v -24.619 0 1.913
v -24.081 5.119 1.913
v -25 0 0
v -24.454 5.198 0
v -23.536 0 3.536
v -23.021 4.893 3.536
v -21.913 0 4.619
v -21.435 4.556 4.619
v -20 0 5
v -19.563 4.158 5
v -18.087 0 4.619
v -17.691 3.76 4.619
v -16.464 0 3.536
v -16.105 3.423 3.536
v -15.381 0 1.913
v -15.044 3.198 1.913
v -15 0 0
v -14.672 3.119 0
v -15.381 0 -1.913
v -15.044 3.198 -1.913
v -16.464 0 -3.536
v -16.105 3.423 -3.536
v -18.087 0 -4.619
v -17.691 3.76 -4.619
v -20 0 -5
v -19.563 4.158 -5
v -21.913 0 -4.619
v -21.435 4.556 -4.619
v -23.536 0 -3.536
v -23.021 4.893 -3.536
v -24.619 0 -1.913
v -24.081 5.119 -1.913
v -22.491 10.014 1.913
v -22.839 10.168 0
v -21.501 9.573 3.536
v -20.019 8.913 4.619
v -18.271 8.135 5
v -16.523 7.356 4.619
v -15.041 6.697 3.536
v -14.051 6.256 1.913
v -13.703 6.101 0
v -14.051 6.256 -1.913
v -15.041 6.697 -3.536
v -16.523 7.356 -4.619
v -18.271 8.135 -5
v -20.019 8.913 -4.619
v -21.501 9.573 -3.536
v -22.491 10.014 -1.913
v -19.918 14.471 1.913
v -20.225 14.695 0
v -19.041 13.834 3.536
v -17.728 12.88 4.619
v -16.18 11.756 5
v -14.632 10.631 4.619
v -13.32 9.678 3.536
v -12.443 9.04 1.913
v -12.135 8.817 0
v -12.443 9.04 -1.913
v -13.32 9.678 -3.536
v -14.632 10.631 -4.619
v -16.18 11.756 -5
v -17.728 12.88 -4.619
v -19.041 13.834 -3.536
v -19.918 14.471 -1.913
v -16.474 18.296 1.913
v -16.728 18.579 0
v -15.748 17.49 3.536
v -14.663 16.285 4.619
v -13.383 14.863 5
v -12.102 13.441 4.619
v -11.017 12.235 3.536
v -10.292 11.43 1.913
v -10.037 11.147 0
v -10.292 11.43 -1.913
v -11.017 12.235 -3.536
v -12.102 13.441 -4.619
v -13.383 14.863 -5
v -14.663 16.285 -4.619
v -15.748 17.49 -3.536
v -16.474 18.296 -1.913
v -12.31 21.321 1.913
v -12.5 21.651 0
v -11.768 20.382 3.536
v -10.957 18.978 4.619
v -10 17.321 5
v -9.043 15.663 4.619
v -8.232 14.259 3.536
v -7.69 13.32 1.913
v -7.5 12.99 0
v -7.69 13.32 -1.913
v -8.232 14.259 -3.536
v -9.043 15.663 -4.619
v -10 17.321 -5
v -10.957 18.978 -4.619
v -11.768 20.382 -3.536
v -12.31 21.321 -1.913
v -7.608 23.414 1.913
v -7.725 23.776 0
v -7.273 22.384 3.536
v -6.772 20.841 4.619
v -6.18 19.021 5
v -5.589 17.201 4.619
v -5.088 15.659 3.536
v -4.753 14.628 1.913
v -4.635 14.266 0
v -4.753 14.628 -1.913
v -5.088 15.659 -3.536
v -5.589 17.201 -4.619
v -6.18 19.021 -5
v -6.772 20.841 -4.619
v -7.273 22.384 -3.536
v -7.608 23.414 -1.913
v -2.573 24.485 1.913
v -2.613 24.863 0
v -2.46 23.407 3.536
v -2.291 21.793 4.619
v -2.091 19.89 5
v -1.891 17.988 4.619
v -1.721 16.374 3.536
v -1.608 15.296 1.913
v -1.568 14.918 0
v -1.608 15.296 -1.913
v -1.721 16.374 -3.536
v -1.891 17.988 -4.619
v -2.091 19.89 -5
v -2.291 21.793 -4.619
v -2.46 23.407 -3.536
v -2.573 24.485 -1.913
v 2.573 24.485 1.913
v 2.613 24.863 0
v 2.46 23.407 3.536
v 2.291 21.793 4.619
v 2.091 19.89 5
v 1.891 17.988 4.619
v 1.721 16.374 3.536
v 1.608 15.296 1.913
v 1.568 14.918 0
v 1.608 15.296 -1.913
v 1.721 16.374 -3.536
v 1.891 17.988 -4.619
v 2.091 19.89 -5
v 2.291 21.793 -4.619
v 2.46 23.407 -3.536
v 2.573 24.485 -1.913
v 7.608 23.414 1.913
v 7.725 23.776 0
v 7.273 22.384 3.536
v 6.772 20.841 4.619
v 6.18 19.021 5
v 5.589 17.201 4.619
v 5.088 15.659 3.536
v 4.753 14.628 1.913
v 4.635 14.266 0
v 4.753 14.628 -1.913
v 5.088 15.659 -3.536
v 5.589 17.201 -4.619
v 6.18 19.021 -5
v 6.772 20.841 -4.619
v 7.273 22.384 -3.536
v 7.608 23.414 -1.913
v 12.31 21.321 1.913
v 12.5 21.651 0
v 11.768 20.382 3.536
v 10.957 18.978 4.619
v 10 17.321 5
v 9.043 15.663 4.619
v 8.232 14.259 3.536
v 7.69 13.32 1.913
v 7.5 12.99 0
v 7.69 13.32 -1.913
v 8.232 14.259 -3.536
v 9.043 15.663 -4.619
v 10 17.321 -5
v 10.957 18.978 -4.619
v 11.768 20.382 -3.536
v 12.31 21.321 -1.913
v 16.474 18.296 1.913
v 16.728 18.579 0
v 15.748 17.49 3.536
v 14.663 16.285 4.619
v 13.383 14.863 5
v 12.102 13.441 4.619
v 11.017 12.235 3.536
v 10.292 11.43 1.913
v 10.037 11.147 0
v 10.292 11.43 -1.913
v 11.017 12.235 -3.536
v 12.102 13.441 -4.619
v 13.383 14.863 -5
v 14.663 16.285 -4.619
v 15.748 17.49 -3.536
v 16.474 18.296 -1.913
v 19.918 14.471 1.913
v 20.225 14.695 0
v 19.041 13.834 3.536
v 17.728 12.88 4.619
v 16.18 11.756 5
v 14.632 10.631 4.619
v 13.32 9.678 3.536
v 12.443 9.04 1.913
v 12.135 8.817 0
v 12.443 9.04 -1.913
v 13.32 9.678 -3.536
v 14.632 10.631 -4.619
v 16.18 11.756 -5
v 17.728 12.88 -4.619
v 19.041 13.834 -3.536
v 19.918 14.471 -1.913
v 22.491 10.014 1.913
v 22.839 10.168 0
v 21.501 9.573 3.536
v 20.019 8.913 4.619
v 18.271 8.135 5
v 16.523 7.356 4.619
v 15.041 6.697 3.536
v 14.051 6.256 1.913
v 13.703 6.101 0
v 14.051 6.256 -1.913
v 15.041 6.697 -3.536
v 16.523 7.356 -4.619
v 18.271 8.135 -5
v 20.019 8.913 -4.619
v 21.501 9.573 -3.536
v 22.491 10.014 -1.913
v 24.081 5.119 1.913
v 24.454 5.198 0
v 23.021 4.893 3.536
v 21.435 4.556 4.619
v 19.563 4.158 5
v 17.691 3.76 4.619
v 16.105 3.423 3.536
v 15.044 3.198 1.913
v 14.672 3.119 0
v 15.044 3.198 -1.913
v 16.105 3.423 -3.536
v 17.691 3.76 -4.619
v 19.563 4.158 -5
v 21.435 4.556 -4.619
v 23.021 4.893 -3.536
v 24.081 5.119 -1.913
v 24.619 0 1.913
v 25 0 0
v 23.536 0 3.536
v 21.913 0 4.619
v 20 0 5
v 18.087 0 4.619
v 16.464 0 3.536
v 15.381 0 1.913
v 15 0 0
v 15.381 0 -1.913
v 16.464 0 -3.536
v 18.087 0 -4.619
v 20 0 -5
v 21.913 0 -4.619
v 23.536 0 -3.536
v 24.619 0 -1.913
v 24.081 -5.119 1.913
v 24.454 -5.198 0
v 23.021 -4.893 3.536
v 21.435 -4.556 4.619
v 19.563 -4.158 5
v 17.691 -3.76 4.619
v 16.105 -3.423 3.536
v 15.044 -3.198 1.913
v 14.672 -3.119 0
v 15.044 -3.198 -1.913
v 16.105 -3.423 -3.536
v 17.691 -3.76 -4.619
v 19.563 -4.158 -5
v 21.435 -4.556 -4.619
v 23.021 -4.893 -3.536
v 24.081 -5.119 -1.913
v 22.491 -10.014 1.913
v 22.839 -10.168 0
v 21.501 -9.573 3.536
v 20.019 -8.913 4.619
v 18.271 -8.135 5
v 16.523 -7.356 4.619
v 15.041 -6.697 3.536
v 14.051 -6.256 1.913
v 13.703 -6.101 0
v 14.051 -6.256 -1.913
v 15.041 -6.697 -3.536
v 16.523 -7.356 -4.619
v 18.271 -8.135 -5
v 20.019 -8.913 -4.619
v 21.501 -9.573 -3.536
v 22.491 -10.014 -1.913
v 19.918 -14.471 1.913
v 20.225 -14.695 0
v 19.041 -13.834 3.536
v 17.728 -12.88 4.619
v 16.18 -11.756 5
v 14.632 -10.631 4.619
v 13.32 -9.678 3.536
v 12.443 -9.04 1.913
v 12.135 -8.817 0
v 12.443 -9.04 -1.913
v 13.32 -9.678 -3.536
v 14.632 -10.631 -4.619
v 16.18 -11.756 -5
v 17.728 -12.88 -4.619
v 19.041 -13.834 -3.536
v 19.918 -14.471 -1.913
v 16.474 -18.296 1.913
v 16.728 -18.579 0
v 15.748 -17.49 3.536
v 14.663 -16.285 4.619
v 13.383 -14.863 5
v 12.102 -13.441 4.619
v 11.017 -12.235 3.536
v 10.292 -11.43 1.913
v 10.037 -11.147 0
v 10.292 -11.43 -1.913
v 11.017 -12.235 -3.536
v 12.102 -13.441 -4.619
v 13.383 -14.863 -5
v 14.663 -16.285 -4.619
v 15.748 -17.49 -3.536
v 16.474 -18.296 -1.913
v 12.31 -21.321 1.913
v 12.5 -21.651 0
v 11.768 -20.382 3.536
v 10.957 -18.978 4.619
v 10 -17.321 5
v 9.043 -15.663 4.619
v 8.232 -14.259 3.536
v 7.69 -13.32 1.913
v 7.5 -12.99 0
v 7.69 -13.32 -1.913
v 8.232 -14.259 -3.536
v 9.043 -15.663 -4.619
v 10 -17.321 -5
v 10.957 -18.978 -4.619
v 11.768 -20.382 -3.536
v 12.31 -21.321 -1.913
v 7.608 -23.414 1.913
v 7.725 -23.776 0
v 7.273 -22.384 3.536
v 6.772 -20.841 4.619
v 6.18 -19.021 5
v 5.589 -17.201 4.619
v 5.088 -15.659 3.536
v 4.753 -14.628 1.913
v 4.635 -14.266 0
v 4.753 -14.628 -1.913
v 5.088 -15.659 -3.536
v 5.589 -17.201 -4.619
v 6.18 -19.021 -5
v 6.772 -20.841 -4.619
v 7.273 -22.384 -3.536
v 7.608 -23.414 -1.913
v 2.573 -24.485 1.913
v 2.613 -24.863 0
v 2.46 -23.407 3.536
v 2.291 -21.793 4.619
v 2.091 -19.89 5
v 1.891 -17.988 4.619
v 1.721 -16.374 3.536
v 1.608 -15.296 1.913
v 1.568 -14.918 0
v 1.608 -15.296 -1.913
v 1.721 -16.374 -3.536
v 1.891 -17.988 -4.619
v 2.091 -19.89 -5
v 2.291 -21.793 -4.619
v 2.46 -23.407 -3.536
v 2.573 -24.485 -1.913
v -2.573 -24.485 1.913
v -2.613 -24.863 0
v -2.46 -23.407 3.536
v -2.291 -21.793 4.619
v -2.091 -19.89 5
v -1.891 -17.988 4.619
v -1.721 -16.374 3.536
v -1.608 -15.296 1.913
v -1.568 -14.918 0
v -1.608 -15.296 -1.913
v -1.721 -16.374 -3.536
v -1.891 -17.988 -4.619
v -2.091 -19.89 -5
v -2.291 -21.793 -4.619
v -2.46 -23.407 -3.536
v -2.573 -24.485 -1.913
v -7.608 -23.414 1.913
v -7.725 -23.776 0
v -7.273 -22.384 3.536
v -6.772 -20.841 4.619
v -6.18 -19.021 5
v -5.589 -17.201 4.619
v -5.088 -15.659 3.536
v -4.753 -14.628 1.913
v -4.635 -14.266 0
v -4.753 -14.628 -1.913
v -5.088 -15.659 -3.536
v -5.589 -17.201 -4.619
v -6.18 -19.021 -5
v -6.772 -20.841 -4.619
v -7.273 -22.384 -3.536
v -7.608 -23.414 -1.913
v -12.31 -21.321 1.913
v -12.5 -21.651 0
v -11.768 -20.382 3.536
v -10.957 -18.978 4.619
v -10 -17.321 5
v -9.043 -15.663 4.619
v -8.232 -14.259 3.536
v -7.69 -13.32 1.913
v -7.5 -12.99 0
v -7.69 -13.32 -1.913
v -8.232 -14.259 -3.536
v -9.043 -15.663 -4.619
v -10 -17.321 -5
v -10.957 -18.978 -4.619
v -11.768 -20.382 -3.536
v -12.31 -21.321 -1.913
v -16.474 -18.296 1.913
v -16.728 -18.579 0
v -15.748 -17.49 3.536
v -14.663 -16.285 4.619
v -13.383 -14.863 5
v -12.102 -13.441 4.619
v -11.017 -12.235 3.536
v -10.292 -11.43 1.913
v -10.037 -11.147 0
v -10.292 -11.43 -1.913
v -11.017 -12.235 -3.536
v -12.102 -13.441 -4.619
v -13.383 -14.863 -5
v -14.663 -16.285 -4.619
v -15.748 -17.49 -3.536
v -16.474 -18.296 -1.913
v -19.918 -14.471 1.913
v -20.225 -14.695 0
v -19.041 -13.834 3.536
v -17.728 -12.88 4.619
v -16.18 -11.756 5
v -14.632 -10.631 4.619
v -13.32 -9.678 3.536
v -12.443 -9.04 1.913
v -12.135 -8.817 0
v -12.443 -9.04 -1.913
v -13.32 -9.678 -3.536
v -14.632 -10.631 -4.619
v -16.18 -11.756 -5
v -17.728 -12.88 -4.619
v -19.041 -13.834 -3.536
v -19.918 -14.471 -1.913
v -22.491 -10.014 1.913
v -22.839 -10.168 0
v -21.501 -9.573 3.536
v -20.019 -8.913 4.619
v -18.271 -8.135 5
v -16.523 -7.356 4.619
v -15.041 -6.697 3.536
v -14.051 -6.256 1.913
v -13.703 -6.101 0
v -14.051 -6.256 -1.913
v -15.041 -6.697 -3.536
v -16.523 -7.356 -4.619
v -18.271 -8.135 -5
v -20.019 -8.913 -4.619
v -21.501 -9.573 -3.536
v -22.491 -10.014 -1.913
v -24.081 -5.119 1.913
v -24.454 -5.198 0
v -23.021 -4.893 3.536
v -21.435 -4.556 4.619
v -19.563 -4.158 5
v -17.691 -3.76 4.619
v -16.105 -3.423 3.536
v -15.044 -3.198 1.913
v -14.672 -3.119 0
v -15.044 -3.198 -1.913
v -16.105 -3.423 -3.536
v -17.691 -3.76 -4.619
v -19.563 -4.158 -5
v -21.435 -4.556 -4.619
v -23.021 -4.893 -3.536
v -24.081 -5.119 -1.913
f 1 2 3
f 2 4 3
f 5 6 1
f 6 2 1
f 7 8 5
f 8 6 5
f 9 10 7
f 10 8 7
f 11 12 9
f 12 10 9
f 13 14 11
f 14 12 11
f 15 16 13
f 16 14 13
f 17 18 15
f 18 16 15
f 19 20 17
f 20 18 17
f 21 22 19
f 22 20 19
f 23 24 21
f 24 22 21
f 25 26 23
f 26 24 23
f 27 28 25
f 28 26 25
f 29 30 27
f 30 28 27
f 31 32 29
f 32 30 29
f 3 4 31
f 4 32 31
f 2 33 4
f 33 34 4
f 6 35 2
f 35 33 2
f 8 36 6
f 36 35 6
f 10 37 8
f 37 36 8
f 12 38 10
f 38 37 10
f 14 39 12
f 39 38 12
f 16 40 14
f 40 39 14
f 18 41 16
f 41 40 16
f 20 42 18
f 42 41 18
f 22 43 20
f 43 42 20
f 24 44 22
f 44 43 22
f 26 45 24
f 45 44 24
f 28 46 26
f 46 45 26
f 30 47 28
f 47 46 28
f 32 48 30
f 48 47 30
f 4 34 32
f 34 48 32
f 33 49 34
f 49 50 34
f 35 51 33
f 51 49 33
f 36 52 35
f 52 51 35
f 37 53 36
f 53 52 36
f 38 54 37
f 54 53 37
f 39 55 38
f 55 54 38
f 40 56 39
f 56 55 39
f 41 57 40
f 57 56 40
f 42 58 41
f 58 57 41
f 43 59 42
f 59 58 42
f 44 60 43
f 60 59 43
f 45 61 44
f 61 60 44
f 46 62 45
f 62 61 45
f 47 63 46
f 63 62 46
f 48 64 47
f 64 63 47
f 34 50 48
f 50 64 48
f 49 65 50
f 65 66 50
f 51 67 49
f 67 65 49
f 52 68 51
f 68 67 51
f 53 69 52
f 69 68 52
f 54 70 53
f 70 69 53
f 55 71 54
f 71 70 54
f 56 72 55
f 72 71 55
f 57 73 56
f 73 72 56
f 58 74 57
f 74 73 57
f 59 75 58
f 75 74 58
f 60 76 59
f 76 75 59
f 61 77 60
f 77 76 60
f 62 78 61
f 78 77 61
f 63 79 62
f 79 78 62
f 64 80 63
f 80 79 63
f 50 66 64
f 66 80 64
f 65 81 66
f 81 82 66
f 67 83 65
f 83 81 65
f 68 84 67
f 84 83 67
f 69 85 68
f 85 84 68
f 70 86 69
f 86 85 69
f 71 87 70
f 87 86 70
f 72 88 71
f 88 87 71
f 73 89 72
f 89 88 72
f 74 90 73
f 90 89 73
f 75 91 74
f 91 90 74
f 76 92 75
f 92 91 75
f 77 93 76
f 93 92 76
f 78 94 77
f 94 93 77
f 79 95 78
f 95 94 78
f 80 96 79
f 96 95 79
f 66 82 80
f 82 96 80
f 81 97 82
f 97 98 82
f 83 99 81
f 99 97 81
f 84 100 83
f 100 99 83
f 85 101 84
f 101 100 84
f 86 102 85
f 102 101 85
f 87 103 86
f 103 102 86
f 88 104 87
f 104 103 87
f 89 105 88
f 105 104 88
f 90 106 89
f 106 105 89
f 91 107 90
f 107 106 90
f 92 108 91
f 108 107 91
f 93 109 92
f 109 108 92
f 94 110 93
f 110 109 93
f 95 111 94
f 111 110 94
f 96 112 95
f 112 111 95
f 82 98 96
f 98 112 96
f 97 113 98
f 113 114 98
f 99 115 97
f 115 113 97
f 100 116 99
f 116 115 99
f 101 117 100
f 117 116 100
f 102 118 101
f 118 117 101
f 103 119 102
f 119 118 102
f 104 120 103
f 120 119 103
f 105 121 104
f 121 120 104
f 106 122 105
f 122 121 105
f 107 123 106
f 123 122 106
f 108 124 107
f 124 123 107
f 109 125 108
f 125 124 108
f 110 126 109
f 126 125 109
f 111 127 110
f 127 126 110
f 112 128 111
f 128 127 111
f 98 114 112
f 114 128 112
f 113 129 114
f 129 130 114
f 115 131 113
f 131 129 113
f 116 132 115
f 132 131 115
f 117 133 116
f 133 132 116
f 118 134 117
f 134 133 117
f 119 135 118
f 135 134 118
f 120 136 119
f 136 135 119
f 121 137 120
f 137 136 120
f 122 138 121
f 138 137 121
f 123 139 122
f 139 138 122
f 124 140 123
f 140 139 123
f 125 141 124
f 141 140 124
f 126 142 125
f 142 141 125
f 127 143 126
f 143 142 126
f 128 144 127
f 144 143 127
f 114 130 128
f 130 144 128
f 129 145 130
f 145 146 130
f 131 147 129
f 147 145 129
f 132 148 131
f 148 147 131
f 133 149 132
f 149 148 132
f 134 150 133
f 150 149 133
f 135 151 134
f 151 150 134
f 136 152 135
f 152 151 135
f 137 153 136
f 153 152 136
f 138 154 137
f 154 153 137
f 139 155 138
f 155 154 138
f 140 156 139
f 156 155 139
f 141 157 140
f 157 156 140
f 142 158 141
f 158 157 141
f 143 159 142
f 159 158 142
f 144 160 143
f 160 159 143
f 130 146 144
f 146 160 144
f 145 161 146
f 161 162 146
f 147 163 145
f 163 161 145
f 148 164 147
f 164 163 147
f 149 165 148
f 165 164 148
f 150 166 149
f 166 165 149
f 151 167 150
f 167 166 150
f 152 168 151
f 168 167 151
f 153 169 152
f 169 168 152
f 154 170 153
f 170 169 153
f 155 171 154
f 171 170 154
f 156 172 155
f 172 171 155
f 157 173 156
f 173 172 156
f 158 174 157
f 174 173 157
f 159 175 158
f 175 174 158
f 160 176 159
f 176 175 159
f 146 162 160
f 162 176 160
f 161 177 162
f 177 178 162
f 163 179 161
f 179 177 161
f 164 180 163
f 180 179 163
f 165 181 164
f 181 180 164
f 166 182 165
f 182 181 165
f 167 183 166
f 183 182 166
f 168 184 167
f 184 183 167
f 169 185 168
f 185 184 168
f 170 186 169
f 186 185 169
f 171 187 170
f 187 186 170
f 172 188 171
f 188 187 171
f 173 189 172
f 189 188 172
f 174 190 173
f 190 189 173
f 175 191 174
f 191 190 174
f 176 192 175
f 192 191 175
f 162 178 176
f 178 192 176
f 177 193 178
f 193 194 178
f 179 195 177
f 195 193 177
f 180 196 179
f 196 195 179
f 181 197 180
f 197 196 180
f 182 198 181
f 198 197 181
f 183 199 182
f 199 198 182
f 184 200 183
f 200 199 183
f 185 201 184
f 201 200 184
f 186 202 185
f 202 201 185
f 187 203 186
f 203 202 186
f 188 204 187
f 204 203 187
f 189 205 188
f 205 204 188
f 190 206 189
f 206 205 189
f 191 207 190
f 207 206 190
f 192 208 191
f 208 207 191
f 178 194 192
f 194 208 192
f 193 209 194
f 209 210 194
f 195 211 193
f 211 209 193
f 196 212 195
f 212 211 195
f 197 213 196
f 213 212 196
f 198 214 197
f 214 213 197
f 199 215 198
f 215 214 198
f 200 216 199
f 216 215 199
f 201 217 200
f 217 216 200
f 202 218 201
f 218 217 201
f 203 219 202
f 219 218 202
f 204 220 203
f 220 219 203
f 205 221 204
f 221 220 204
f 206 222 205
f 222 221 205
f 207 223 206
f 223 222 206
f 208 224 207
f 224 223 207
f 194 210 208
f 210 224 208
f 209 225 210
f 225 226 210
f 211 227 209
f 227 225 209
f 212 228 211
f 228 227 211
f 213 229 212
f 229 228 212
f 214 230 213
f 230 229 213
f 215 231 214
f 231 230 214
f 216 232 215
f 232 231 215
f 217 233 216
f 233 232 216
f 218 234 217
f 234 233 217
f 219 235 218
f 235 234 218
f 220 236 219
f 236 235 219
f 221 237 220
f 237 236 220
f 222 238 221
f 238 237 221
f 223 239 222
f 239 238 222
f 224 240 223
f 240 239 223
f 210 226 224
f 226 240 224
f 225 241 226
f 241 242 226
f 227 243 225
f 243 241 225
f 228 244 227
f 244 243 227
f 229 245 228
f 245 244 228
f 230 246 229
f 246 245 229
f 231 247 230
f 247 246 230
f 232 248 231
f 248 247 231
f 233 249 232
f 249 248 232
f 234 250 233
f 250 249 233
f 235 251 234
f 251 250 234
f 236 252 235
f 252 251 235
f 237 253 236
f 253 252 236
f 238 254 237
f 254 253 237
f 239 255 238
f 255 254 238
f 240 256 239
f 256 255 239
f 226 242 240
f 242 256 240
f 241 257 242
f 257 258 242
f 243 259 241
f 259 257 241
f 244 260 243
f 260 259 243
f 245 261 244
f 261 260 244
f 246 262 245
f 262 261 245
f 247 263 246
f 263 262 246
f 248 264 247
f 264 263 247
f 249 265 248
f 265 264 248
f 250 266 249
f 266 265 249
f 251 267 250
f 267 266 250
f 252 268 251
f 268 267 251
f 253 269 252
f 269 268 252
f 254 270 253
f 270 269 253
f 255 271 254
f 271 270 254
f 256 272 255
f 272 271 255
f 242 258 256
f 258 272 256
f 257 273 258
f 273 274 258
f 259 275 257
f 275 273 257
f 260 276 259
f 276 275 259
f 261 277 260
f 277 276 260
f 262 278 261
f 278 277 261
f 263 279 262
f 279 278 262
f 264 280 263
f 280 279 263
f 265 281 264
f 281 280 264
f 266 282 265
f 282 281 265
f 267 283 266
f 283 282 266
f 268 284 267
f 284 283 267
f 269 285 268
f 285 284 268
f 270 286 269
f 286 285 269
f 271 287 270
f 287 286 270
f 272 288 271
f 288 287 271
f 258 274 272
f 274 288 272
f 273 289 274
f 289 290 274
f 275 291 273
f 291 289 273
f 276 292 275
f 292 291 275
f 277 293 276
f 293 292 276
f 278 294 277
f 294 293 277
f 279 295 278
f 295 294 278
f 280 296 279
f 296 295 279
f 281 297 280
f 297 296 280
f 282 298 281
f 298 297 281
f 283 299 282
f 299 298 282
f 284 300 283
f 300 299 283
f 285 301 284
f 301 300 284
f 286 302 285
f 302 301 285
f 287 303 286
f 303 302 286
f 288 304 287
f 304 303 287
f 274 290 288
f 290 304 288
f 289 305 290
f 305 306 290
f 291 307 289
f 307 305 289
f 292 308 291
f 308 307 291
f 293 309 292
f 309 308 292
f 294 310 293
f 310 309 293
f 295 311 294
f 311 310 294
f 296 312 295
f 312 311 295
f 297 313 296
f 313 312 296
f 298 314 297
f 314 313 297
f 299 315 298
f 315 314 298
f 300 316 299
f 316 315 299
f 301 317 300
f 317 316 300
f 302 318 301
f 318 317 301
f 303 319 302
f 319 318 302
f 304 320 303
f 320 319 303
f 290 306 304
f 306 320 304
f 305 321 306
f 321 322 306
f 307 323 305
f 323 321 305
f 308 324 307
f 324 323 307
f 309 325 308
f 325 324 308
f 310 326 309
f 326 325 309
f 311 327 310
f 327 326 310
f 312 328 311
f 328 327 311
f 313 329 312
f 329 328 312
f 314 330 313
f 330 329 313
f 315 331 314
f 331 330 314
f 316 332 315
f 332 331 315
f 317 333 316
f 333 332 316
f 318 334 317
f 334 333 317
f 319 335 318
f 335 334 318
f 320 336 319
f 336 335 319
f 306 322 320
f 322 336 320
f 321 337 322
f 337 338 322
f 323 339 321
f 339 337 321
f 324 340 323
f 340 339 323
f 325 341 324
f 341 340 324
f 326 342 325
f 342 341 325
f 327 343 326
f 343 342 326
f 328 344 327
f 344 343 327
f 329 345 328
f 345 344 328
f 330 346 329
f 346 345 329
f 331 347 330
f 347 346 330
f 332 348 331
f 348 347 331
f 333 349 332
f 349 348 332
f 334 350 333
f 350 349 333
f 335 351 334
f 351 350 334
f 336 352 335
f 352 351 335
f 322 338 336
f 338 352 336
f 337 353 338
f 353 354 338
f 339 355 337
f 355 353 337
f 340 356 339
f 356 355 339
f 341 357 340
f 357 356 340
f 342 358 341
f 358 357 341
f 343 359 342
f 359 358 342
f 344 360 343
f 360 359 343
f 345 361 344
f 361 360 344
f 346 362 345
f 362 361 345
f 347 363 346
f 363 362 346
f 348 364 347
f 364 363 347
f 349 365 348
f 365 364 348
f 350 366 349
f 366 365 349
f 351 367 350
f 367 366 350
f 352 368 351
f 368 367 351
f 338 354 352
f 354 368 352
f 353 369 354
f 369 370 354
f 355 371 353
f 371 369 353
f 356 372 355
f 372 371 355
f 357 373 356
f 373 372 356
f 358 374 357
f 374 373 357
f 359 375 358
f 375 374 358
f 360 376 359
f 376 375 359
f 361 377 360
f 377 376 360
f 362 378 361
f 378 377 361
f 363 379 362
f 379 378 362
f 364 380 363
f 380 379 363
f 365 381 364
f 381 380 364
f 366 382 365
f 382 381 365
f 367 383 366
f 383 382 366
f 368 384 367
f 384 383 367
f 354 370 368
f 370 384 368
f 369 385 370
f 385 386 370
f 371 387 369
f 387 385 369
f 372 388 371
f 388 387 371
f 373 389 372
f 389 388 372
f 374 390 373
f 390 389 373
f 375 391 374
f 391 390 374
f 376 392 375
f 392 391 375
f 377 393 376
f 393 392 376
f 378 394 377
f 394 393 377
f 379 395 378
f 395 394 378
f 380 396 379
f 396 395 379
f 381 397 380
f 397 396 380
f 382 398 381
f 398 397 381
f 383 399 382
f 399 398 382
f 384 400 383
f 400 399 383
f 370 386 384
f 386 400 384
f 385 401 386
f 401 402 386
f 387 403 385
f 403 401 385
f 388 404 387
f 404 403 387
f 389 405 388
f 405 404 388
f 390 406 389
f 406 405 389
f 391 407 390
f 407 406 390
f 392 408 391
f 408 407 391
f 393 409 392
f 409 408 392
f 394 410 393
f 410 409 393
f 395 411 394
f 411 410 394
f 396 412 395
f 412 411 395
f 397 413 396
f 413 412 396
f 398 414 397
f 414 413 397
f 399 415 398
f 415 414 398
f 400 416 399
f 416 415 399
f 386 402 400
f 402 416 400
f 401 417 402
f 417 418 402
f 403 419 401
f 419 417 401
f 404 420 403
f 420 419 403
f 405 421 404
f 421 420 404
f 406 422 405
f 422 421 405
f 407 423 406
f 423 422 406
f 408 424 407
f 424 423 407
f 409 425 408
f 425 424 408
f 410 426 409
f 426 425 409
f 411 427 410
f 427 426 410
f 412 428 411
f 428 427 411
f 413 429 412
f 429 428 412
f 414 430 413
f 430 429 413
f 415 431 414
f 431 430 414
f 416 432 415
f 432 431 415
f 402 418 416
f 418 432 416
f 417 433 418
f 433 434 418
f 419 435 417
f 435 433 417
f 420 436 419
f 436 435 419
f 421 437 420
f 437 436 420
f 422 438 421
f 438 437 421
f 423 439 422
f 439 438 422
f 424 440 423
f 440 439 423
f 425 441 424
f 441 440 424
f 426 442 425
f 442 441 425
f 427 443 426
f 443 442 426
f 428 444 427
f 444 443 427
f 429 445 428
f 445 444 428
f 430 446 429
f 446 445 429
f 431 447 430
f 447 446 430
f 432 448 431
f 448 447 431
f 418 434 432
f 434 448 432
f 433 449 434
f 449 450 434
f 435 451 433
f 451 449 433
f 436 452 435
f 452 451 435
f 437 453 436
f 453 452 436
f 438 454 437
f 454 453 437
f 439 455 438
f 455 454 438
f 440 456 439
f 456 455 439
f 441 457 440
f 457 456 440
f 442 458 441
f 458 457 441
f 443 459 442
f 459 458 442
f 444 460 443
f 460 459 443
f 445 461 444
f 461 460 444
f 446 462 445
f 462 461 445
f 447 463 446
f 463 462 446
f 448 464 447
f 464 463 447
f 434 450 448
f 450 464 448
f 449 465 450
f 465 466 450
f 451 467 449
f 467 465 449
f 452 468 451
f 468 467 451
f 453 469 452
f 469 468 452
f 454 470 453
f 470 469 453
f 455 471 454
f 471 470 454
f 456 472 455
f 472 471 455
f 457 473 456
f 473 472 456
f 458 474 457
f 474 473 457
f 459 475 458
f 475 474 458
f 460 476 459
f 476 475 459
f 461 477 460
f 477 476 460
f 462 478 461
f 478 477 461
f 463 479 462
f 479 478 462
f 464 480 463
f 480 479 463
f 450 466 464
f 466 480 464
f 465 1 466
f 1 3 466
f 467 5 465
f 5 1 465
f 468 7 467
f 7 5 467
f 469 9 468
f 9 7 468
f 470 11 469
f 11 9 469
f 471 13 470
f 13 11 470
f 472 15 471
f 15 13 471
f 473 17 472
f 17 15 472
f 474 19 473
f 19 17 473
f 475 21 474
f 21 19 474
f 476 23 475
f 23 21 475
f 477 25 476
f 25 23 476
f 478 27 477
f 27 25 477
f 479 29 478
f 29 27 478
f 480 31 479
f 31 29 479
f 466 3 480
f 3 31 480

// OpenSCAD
// param: major_radius=20, minor_radius=5
module param_torus(major_radius=20, minor_radius=5) {
    rotate_extrude() translate([major_radius, 0, 0]) circle(r=minor_radius);
}
param_torus(major_radius=20, minor_radius=5);
